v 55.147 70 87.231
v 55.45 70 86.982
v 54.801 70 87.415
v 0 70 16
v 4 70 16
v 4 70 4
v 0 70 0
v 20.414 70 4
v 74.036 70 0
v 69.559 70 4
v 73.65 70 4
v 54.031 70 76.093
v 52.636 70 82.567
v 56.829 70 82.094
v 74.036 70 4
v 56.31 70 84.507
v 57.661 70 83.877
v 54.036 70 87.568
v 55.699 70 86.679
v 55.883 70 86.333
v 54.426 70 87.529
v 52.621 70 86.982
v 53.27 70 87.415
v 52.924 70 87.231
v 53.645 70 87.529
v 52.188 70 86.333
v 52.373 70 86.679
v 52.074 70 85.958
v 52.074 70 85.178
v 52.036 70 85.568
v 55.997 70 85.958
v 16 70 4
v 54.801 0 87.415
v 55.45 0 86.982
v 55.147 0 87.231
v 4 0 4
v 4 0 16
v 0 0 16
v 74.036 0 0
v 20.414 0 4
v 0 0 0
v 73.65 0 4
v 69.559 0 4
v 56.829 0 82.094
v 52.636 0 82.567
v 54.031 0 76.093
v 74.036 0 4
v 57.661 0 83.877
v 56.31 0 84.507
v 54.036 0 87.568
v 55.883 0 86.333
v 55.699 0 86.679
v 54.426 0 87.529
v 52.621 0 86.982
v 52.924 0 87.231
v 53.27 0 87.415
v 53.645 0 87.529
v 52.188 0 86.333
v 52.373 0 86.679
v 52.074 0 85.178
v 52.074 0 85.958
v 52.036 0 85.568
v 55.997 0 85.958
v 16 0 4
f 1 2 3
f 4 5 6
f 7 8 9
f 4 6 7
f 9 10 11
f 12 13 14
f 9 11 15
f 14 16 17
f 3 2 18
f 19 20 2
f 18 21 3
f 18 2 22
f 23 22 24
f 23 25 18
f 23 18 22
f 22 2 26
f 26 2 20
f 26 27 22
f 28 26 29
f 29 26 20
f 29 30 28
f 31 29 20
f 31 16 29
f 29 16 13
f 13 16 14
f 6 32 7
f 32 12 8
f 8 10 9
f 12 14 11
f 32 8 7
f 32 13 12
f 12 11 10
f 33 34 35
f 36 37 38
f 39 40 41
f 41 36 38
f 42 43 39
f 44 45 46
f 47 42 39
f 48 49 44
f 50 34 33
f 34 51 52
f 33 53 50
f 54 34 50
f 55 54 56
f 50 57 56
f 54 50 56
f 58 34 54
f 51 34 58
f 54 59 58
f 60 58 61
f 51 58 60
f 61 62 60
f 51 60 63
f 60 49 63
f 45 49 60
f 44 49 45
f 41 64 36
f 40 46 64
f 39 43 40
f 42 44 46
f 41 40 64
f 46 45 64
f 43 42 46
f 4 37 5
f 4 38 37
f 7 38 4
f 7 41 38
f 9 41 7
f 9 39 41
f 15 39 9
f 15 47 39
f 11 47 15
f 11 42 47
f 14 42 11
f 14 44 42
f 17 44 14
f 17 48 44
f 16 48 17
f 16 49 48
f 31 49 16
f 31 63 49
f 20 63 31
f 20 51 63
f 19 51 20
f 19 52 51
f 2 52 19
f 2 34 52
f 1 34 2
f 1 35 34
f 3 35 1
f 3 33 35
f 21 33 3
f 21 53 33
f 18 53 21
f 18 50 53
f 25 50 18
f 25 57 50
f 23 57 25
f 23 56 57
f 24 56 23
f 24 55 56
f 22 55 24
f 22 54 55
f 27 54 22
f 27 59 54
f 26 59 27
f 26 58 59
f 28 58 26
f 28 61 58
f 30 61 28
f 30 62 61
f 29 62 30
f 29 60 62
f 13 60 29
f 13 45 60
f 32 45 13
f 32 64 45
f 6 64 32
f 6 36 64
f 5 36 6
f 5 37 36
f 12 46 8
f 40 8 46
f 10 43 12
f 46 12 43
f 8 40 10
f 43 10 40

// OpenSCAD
// Phone stand
// A desk stand that holds a phone at a fixed viewing angle.

/* [Stand] */
// Viewing angle from the desk (degrees)
angle = 65; // [45:1:80]
// Phone thickness including the case (mm)
phone_thickness = 12; // [6:0.5:20]
// Stand width (mm)
width = 70; // [30:1:150]
// Front lip height (mm)
lip_height = 12; // [5:1:30]

/* [Hidden] */
t = 4;
rest_length = 90;
$fn = 32;

rest_start = [t + phone_thickness, t];
rest_end = rest_start + rest_length * [cos(angle), sin(angle)];
base_length = rest_end[0] + 20;

module profile() {
  square([base_length, t]);
  square([t, lip_height + t]);
  translate(rest_start) rotate(angle) translate([0, -t]) square([rest_length, t]);
  hull() {
    translate(rest_end) circle(d = t);
    translate([base_length - t / 2, t / 2]) circle(d = t);
  }
}

rotate([90, 0, 0]) translate([0, 0, -width]) linear_extrude(height = width) profile();
